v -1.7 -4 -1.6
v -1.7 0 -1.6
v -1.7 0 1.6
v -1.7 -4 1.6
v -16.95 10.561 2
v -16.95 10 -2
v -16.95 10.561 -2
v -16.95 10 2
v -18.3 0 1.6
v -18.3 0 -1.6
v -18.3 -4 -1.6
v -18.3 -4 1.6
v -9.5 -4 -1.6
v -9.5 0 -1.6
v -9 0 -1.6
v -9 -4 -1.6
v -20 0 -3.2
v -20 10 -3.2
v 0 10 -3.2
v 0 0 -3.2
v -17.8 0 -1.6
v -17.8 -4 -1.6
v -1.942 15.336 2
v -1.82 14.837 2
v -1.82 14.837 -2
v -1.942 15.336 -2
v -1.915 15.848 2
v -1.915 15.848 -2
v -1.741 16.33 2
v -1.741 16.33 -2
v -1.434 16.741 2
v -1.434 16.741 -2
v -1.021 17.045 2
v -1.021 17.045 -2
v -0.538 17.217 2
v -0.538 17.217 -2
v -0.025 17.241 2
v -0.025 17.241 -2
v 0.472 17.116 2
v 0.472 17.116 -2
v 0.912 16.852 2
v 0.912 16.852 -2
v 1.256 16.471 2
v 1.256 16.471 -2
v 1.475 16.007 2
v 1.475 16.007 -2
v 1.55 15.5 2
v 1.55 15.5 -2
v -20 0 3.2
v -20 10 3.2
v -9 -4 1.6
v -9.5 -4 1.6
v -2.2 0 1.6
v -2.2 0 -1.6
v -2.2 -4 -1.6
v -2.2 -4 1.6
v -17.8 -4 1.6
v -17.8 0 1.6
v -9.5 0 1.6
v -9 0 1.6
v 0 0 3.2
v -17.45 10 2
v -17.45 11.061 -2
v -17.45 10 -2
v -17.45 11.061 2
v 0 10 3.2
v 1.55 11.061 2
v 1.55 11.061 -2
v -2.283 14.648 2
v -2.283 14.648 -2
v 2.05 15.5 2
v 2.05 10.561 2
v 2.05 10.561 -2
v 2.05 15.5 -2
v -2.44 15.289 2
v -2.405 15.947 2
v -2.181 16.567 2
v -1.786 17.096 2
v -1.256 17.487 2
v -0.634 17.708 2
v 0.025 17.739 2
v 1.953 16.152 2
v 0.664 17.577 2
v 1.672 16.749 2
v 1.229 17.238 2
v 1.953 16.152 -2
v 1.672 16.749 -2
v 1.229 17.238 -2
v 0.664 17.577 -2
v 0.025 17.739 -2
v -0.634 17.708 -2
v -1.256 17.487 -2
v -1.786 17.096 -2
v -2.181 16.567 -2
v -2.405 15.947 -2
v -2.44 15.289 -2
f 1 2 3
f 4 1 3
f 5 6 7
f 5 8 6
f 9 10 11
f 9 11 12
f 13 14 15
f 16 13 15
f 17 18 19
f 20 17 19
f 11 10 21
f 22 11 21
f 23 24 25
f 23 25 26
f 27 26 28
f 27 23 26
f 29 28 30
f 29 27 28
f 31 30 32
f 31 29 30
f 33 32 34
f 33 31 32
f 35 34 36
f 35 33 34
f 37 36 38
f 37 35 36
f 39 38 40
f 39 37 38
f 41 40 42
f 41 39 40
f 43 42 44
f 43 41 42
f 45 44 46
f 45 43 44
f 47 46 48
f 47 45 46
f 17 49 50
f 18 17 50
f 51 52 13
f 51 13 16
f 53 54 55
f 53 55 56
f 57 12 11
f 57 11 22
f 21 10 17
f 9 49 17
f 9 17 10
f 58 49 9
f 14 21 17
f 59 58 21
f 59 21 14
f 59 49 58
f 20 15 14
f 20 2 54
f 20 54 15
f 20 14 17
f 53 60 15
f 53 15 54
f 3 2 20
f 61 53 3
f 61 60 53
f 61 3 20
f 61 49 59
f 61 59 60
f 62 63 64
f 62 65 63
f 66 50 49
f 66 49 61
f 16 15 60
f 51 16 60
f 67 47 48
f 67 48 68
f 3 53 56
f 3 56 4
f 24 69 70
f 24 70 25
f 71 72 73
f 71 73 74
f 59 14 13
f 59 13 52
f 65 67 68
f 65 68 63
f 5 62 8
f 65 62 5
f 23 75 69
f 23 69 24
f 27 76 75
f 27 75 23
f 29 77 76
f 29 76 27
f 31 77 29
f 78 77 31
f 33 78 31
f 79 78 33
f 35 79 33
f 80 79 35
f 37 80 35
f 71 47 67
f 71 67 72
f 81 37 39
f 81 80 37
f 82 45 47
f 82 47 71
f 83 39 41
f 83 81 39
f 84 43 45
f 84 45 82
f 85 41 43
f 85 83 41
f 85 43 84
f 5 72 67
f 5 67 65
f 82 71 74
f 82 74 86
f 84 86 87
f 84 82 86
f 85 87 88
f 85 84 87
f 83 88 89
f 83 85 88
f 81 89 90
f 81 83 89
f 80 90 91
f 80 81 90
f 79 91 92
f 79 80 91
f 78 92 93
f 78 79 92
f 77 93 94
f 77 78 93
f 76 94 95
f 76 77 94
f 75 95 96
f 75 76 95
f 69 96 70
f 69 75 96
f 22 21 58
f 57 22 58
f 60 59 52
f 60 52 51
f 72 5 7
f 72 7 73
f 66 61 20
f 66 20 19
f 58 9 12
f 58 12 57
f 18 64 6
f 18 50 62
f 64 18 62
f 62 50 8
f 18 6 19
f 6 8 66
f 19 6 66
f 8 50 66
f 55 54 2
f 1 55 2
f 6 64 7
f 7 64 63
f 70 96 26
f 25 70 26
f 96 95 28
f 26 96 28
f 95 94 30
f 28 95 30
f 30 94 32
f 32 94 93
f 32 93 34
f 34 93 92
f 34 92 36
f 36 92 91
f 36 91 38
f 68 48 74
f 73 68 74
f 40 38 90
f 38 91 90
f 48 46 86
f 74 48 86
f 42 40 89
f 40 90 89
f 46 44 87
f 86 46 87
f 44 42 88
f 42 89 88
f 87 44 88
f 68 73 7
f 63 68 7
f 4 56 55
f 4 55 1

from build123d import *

# Parameters (mm, degrees)
SKETCH_1_W        = 20
SKETCH_1_H        = 10
EXTRUDE_1_DEPTH   = 3.2
SKETCH_2_W        = 0.5
SKETCH_2_H        = 3.2
EXTRUDE_1_2_DEPTH = 4
EXTRUDE_2_DEPTH   = 2


with BuildPart() as part:
    # Эскиз1 → Extrude 1 (new, symmetric)
    with BuildSketch(Plane.XY):
        with Locations((-10, 5)):
            Rectangle(SKETCH_1_W, SKETCH_1_H)
    extrude(amount=EXTRUDE_1_DEPTH, both=True)

    # Эскиз2 → Extrude 1 2 (add)
    with BuildSketch(Plane.XZ):
        with Locations((-18.05, 0)):
            Rectangle(SKETCH_2_W, SKETCH_2_H)
        with Locations((-9.25, 0)):
            Rectangle(SKETCH_2_W, SKETCH_2_H)
        with Locations((-1.95, 0)):
            Rectangle(SKETCH_2_W, SKETCH_2_H)
    extrude(amount=EXTRUDE_1_2_DEPTH)

    # Эскиз3 → Вытянуть-Тонкостенный2 (add, symmetric)
    with BuildSketch(Plane.XY):
        with BuildLine():
            Line((-16.95, 10), (-16.95, 10.561276731))
            Line((-16.95, 10.561276731), (2.05, 10.561276731))
            Line((2.05, 10.561276731), (2.05, 15.5))
            ThreePointArc((2.05, 15.5), (-0.634058048, 17.70773495), (-2.282527654, 14.648191002))
            Line((-2.282527654, 14.648191002), (-1.819743731, 14.83748189))
            ThreePointArc((-1.819743731, 14.83748189), (-0.537600704, 17.217127184), (1.55, 15.5))
            Line((1.55, 15.5), (1.55, 11.061276731))
            Line((1.55, 11.061276731), (-17.45, 11.061276731))
            Line((-17.45, 11.061276731), (-17.45, 10))
            Line((-17.45, 10), (-16.95, 10))
        make_face()
    extrude(amount=EXTRUDE_2_DEPTH, both=True)


solid = part.part
